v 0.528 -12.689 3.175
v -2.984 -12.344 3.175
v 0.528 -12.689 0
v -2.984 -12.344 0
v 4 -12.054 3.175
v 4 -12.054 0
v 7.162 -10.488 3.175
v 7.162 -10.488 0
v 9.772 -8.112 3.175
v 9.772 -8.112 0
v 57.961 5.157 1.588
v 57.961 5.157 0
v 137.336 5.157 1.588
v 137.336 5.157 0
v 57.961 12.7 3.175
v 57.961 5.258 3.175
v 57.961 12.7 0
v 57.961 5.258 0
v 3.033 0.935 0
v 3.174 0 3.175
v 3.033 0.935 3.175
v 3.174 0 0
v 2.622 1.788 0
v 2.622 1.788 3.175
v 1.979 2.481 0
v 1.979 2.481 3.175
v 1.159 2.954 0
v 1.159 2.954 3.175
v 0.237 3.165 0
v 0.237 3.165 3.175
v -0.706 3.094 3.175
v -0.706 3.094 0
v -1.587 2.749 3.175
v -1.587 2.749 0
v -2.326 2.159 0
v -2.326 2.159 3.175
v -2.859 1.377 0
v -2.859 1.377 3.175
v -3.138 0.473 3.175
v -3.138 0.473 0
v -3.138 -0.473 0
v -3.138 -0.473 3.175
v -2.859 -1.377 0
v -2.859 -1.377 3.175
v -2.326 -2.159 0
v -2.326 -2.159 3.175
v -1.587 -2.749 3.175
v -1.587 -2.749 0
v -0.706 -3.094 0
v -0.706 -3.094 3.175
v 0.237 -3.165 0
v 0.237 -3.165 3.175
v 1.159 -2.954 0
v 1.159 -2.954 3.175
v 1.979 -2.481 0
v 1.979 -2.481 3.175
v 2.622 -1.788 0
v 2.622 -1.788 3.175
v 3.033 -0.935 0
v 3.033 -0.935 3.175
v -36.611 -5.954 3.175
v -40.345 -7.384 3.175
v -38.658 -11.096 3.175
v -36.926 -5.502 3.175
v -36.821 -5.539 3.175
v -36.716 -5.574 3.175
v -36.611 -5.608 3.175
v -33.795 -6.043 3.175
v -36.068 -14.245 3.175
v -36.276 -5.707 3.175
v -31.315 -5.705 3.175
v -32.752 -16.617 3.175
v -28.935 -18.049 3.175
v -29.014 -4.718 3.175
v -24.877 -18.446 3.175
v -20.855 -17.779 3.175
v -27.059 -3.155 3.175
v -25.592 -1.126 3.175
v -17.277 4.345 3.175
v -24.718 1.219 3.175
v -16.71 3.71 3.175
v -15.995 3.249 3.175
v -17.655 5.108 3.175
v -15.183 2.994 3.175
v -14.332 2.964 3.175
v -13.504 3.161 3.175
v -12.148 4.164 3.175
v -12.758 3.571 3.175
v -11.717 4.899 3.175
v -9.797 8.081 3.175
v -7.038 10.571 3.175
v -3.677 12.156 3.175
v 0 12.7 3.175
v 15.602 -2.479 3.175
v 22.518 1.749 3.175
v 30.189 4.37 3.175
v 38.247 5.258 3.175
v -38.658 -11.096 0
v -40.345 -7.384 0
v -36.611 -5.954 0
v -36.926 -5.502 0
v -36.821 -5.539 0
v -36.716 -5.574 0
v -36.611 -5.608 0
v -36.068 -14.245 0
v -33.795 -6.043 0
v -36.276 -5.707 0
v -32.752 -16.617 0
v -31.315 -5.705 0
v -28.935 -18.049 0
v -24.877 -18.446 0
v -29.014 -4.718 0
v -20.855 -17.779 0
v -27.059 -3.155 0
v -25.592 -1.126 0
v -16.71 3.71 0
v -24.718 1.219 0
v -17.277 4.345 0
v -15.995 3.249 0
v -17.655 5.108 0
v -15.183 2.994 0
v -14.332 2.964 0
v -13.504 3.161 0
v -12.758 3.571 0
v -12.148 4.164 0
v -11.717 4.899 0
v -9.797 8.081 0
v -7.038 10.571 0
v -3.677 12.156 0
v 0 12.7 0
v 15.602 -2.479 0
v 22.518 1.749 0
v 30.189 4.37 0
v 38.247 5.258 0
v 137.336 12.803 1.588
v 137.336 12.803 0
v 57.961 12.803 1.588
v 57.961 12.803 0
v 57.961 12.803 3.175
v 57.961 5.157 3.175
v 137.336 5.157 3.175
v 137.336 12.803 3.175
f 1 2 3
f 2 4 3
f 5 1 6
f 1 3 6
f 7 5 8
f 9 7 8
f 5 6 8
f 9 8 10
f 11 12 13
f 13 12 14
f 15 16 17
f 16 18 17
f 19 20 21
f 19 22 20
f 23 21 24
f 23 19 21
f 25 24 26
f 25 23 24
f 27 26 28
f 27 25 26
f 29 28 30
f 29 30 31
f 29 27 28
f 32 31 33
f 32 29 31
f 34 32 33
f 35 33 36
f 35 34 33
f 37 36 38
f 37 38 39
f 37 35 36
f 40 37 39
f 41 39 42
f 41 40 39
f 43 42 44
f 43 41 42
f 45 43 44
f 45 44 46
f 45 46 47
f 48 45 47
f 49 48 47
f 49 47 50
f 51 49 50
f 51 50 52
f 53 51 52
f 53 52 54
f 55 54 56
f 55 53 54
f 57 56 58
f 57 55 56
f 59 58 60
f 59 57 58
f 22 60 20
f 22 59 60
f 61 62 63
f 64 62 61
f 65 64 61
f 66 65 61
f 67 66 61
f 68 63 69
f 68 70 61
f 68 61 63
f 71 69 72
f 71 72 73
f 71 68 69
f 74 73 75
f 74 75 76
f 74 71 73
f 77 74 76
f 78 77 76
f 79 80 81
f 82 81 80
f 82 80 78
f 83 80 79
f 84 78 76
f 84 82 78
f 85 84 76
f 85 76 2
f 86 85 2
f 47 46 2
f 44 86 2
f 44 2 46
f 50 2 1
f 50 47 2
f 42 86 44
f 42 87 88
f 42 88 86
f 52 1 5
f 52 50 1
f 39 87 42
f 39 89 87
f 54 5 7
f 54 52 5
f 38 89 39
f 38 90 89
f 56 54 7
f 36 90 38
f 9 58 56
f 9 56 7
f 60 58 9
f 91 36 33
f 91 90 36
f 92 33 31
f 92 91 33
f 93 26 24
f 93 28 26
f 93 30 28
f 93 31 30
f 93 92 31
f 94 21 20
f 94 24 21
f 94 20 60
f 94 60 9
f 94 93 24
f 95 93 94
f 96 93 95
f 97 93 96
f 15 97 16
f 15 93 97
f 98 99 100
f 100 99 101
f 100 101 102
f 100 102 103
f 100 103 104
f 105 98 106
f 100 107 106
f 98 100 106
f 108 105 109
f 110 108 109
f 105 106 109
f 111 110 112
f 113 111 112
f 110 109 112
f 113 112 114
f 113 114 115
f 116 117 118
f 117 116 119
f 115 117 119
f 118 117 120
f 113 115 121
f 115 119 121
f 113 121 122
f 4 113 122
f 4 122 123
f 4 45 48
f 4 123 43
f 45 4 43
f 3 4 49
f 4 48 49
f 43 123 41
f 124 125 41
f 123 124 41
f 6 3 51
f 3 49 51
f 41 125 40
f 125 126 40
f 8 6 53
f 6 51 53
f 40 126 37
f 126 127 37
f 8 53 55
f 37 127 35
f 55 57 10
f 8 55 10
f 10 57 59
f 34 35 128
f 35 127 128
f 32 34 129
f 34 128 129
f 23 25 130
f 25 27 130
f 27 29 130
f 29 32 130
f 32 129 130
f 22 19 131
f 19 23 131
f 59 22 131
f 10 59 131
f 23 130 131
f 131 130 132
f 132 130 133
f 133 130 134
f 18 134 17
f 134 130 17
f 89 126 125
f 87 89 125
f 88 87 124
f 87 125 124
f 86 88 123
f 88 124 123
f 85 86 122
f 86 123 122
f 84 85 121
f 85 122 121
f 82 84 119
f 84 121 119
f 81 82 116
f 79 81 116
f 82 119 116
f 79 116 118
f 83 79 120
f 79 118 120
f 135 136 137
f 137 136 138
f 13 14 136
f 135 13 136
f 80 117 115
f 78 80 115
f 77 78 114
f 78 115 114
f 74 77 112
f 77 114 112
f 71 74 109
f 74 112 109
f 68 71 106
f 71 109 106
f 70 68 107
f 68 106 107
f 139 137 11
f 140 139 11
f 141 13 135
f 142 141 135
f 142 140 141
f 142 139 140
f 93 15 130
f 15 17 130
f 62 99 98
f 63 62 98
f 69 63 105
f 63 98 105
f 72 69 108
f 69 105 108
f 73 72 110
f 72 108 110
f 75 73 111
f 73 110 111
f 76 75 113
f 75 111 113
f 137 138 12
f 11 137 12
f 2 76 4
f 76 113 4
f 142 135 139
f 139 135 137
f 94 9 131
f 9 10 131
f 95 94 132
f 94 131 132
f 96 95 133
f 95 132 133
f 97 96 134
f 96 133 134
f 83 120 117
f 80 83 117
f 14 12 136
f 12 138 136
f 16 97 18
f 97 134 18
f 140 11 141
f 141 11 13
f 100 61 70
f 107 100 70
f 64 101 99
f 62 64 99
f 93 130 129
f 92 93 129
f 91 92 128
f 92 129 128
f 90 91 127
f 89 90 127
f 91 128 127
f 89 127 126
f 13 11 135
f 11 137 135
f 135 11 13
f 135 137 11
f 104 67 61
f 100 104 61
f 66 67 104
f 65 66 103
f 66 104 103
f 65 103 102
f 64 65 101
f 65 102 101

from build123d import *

# Parameters (mm, degrees)
F1_R     = 3.1736948077
F2_DEPTH = 1.5875
F3_DEPTH = 1.5875
F4_DEPTH = 1.5875
F6_DEPTH = 25.4


with BuildPart() as f2:
    # F1 (on face) → F2 (new body)
    with BuildSketch(Plane.XY):
        with BuildLine():
            ThreePointArc((-40.3451274018, -7.3844323762), (-32.7517807814, -16.6165715435), (-20.8546804416, -17.7785999452))
            Line((-20.8546804416, -17.7785999452), (-2.9840807938, -12.3444425478))
            ThreePointArc((-2.9840807938, -12.3444425478), (3.9996215585, -12.0537557379), (9.771792507, -8.1118475823))
            ThreePointArc((9.771792507, -8.1118475823), (22.5181286005, 1.749315086), (38.2470712066, 5.2581578403))
            Line((38.2470712066, 5.2581578403), (57.9611142654, 5.2581578403))
            Line((57.9611142654, 5.2581578403), (57.9611142654, 12.7))
            Line((57.9611142654, 12.7), (0, 12.7))
            ThreePointArc((0, 12.7), (-7.0383356023, 10.5712739038), (-11.7171926739, 4.8987136927))
            ThreePointArc((-11.7171926739, 4.8987136927), (-14.7583668014, 2.950363788), (-17.6547681255, 5.1080632099))
            Line((-17.6547681255, 5.1080632099), (-24.7176810189, 1.2194774422))
            ThreePointArc((-24.7176810189, 1.2194774422), (-29.3095141905, -4.8881094223), (-36.925990654, -5.5019786781))
            Line((-36.925990654, -5.5019786781), (-40.3451274018, -7.3844323762))
        make_face()
        Circle(F1_R, mode=Mode.SUBTRACT)
    extrude(amount=F2_DEPTH)

    # F3 (add): a face of the model
    f3_faces = [f2.faces().sort_by_distance(p)[0] for p in [
        (-6.4668185994, 9.7128802267, 1.5875),
    ]]
    extrude(f3_faces, amount=F3_DEPTH)

    # F5 (on face) → F6 (cut)
    with BuildSketch(Plane.XY.offset(3.175)):
        with BuildLine():
            ThreePointArc((-36.2762714732, -5.7071182517), (-36.4439228923, -5.6591640871), (-36.6106467962, -5.6080784715))
            Line((-36.6106467962, -5.6080784715), (-36.6106467962, -5.954187482))
            Line((-36.6106467962, -5.954187482), (-36.2762714732, -5.7071182517))
        make_face()
    extrude(amount=-F6_DEPTH, mode=Mode.SUBTRACT)


with BuildPart() as f2b:
    # F0 (on Top) → F2, piece 2 (new body)
    with BuildSketch(Plane.XY):
        Polygon((57.9611142654, 12.7), (57.9611142654, 5.2581578403), (57.9611142654, 5.1571133081), (137.3361142654, 5.1571133081), (137.3361142654, 12.8025133081), (57.9611142654, 12.8025133081), align=None)
    extrude(amount=F2_DEPTH)


with BuildPart() as f4:
    # F4 (new): a face of the model
    f4_faces = [f2b.part.faces().sort_by_distance(p)[0] for p in [
        (97.6486142654, 8.9798133081, 1.5875),
    ]]
    extrude(f4_faces, amount=F4_DEPTH)


solid = Compound([f2.part, f2b.part, f4.part])
